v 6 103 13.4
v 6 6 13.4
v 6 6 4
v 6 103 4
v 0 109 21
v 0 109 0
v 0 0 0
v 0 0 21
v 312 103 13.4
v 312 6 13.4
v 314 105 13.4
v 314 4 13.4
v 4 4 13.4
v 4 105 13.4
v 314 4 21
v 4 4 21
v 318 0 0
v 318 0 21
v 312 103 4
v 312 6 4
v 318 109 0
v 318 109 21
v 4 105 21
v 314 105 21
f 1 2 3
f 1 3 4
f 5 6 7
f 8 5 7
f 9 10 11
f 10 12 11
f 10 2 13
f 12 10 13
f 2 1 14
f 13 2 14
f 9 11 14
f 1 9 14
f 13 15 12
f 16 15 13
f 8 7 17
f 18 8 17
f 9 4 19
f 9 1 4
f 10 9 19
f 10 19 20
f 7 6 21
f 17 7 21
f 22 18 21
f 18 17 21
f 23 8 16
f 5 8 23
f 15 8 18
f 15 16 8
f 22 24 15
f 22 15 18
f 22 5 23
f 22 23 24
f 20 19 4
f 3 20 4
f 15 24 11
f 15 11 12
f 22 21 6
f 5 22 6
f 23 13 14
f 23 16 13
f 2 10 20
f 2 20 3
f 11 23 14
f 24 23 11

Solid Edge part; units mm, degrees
sketch "Sketch1" plane through (0, 0, 0) normal (0, 0, 1) x (1, 0, 0)
  line L0 (0, 0) -> (318, 0)
  line L1 (318, 0) -> (318, 109)
  line L2 (318, 109) -> (0, 109)
  line L3 (0, 109) -> (0, 0)
extrude "Protrusion1" add sketch "Sketch1" along normal blind 21
sketch "Sketch2" plane through (159, 54.5, 21) normal (0, 0, 1) x (1, 0, 0)
  line L0 (-153, 48.5) -> (153, 48.5)
  line L1 (153, 48.5) -> (153, -48.5)
  line L2 (153, -48.5) -> (-153, -48.5)
  line L3 (-153, -48.5) -> (-153, 48.5)
  dimension "D1" = 6
  dimension "D2" = 6
  dimension "D3" = 6
  dimension "D4" = 6
extrude "ExtrudedCutout_1" cut sketch "Sketch2" against normal blind 17
sketch "Sketch3" plane through (159, 54.5, 21) normal (0, 0, 1) x (1, 0, 0)
  line L0 (-155, 50.5) -> (155, 50.5)
  line L1 (155, 50.5) -> (155, -50.5)
  line L2 (155, -50.5) -> (-155, -50.5)
  line L3 (-155, -50.5) -> (-155, 50.5)
  dimension "D1" = 4
  dimension "D2" = 4
  dimension "D3" = 4
  dimension "D4" = 4
extrude "Cutout1" cut sketch "Sketch3" against normal blind 7.6
